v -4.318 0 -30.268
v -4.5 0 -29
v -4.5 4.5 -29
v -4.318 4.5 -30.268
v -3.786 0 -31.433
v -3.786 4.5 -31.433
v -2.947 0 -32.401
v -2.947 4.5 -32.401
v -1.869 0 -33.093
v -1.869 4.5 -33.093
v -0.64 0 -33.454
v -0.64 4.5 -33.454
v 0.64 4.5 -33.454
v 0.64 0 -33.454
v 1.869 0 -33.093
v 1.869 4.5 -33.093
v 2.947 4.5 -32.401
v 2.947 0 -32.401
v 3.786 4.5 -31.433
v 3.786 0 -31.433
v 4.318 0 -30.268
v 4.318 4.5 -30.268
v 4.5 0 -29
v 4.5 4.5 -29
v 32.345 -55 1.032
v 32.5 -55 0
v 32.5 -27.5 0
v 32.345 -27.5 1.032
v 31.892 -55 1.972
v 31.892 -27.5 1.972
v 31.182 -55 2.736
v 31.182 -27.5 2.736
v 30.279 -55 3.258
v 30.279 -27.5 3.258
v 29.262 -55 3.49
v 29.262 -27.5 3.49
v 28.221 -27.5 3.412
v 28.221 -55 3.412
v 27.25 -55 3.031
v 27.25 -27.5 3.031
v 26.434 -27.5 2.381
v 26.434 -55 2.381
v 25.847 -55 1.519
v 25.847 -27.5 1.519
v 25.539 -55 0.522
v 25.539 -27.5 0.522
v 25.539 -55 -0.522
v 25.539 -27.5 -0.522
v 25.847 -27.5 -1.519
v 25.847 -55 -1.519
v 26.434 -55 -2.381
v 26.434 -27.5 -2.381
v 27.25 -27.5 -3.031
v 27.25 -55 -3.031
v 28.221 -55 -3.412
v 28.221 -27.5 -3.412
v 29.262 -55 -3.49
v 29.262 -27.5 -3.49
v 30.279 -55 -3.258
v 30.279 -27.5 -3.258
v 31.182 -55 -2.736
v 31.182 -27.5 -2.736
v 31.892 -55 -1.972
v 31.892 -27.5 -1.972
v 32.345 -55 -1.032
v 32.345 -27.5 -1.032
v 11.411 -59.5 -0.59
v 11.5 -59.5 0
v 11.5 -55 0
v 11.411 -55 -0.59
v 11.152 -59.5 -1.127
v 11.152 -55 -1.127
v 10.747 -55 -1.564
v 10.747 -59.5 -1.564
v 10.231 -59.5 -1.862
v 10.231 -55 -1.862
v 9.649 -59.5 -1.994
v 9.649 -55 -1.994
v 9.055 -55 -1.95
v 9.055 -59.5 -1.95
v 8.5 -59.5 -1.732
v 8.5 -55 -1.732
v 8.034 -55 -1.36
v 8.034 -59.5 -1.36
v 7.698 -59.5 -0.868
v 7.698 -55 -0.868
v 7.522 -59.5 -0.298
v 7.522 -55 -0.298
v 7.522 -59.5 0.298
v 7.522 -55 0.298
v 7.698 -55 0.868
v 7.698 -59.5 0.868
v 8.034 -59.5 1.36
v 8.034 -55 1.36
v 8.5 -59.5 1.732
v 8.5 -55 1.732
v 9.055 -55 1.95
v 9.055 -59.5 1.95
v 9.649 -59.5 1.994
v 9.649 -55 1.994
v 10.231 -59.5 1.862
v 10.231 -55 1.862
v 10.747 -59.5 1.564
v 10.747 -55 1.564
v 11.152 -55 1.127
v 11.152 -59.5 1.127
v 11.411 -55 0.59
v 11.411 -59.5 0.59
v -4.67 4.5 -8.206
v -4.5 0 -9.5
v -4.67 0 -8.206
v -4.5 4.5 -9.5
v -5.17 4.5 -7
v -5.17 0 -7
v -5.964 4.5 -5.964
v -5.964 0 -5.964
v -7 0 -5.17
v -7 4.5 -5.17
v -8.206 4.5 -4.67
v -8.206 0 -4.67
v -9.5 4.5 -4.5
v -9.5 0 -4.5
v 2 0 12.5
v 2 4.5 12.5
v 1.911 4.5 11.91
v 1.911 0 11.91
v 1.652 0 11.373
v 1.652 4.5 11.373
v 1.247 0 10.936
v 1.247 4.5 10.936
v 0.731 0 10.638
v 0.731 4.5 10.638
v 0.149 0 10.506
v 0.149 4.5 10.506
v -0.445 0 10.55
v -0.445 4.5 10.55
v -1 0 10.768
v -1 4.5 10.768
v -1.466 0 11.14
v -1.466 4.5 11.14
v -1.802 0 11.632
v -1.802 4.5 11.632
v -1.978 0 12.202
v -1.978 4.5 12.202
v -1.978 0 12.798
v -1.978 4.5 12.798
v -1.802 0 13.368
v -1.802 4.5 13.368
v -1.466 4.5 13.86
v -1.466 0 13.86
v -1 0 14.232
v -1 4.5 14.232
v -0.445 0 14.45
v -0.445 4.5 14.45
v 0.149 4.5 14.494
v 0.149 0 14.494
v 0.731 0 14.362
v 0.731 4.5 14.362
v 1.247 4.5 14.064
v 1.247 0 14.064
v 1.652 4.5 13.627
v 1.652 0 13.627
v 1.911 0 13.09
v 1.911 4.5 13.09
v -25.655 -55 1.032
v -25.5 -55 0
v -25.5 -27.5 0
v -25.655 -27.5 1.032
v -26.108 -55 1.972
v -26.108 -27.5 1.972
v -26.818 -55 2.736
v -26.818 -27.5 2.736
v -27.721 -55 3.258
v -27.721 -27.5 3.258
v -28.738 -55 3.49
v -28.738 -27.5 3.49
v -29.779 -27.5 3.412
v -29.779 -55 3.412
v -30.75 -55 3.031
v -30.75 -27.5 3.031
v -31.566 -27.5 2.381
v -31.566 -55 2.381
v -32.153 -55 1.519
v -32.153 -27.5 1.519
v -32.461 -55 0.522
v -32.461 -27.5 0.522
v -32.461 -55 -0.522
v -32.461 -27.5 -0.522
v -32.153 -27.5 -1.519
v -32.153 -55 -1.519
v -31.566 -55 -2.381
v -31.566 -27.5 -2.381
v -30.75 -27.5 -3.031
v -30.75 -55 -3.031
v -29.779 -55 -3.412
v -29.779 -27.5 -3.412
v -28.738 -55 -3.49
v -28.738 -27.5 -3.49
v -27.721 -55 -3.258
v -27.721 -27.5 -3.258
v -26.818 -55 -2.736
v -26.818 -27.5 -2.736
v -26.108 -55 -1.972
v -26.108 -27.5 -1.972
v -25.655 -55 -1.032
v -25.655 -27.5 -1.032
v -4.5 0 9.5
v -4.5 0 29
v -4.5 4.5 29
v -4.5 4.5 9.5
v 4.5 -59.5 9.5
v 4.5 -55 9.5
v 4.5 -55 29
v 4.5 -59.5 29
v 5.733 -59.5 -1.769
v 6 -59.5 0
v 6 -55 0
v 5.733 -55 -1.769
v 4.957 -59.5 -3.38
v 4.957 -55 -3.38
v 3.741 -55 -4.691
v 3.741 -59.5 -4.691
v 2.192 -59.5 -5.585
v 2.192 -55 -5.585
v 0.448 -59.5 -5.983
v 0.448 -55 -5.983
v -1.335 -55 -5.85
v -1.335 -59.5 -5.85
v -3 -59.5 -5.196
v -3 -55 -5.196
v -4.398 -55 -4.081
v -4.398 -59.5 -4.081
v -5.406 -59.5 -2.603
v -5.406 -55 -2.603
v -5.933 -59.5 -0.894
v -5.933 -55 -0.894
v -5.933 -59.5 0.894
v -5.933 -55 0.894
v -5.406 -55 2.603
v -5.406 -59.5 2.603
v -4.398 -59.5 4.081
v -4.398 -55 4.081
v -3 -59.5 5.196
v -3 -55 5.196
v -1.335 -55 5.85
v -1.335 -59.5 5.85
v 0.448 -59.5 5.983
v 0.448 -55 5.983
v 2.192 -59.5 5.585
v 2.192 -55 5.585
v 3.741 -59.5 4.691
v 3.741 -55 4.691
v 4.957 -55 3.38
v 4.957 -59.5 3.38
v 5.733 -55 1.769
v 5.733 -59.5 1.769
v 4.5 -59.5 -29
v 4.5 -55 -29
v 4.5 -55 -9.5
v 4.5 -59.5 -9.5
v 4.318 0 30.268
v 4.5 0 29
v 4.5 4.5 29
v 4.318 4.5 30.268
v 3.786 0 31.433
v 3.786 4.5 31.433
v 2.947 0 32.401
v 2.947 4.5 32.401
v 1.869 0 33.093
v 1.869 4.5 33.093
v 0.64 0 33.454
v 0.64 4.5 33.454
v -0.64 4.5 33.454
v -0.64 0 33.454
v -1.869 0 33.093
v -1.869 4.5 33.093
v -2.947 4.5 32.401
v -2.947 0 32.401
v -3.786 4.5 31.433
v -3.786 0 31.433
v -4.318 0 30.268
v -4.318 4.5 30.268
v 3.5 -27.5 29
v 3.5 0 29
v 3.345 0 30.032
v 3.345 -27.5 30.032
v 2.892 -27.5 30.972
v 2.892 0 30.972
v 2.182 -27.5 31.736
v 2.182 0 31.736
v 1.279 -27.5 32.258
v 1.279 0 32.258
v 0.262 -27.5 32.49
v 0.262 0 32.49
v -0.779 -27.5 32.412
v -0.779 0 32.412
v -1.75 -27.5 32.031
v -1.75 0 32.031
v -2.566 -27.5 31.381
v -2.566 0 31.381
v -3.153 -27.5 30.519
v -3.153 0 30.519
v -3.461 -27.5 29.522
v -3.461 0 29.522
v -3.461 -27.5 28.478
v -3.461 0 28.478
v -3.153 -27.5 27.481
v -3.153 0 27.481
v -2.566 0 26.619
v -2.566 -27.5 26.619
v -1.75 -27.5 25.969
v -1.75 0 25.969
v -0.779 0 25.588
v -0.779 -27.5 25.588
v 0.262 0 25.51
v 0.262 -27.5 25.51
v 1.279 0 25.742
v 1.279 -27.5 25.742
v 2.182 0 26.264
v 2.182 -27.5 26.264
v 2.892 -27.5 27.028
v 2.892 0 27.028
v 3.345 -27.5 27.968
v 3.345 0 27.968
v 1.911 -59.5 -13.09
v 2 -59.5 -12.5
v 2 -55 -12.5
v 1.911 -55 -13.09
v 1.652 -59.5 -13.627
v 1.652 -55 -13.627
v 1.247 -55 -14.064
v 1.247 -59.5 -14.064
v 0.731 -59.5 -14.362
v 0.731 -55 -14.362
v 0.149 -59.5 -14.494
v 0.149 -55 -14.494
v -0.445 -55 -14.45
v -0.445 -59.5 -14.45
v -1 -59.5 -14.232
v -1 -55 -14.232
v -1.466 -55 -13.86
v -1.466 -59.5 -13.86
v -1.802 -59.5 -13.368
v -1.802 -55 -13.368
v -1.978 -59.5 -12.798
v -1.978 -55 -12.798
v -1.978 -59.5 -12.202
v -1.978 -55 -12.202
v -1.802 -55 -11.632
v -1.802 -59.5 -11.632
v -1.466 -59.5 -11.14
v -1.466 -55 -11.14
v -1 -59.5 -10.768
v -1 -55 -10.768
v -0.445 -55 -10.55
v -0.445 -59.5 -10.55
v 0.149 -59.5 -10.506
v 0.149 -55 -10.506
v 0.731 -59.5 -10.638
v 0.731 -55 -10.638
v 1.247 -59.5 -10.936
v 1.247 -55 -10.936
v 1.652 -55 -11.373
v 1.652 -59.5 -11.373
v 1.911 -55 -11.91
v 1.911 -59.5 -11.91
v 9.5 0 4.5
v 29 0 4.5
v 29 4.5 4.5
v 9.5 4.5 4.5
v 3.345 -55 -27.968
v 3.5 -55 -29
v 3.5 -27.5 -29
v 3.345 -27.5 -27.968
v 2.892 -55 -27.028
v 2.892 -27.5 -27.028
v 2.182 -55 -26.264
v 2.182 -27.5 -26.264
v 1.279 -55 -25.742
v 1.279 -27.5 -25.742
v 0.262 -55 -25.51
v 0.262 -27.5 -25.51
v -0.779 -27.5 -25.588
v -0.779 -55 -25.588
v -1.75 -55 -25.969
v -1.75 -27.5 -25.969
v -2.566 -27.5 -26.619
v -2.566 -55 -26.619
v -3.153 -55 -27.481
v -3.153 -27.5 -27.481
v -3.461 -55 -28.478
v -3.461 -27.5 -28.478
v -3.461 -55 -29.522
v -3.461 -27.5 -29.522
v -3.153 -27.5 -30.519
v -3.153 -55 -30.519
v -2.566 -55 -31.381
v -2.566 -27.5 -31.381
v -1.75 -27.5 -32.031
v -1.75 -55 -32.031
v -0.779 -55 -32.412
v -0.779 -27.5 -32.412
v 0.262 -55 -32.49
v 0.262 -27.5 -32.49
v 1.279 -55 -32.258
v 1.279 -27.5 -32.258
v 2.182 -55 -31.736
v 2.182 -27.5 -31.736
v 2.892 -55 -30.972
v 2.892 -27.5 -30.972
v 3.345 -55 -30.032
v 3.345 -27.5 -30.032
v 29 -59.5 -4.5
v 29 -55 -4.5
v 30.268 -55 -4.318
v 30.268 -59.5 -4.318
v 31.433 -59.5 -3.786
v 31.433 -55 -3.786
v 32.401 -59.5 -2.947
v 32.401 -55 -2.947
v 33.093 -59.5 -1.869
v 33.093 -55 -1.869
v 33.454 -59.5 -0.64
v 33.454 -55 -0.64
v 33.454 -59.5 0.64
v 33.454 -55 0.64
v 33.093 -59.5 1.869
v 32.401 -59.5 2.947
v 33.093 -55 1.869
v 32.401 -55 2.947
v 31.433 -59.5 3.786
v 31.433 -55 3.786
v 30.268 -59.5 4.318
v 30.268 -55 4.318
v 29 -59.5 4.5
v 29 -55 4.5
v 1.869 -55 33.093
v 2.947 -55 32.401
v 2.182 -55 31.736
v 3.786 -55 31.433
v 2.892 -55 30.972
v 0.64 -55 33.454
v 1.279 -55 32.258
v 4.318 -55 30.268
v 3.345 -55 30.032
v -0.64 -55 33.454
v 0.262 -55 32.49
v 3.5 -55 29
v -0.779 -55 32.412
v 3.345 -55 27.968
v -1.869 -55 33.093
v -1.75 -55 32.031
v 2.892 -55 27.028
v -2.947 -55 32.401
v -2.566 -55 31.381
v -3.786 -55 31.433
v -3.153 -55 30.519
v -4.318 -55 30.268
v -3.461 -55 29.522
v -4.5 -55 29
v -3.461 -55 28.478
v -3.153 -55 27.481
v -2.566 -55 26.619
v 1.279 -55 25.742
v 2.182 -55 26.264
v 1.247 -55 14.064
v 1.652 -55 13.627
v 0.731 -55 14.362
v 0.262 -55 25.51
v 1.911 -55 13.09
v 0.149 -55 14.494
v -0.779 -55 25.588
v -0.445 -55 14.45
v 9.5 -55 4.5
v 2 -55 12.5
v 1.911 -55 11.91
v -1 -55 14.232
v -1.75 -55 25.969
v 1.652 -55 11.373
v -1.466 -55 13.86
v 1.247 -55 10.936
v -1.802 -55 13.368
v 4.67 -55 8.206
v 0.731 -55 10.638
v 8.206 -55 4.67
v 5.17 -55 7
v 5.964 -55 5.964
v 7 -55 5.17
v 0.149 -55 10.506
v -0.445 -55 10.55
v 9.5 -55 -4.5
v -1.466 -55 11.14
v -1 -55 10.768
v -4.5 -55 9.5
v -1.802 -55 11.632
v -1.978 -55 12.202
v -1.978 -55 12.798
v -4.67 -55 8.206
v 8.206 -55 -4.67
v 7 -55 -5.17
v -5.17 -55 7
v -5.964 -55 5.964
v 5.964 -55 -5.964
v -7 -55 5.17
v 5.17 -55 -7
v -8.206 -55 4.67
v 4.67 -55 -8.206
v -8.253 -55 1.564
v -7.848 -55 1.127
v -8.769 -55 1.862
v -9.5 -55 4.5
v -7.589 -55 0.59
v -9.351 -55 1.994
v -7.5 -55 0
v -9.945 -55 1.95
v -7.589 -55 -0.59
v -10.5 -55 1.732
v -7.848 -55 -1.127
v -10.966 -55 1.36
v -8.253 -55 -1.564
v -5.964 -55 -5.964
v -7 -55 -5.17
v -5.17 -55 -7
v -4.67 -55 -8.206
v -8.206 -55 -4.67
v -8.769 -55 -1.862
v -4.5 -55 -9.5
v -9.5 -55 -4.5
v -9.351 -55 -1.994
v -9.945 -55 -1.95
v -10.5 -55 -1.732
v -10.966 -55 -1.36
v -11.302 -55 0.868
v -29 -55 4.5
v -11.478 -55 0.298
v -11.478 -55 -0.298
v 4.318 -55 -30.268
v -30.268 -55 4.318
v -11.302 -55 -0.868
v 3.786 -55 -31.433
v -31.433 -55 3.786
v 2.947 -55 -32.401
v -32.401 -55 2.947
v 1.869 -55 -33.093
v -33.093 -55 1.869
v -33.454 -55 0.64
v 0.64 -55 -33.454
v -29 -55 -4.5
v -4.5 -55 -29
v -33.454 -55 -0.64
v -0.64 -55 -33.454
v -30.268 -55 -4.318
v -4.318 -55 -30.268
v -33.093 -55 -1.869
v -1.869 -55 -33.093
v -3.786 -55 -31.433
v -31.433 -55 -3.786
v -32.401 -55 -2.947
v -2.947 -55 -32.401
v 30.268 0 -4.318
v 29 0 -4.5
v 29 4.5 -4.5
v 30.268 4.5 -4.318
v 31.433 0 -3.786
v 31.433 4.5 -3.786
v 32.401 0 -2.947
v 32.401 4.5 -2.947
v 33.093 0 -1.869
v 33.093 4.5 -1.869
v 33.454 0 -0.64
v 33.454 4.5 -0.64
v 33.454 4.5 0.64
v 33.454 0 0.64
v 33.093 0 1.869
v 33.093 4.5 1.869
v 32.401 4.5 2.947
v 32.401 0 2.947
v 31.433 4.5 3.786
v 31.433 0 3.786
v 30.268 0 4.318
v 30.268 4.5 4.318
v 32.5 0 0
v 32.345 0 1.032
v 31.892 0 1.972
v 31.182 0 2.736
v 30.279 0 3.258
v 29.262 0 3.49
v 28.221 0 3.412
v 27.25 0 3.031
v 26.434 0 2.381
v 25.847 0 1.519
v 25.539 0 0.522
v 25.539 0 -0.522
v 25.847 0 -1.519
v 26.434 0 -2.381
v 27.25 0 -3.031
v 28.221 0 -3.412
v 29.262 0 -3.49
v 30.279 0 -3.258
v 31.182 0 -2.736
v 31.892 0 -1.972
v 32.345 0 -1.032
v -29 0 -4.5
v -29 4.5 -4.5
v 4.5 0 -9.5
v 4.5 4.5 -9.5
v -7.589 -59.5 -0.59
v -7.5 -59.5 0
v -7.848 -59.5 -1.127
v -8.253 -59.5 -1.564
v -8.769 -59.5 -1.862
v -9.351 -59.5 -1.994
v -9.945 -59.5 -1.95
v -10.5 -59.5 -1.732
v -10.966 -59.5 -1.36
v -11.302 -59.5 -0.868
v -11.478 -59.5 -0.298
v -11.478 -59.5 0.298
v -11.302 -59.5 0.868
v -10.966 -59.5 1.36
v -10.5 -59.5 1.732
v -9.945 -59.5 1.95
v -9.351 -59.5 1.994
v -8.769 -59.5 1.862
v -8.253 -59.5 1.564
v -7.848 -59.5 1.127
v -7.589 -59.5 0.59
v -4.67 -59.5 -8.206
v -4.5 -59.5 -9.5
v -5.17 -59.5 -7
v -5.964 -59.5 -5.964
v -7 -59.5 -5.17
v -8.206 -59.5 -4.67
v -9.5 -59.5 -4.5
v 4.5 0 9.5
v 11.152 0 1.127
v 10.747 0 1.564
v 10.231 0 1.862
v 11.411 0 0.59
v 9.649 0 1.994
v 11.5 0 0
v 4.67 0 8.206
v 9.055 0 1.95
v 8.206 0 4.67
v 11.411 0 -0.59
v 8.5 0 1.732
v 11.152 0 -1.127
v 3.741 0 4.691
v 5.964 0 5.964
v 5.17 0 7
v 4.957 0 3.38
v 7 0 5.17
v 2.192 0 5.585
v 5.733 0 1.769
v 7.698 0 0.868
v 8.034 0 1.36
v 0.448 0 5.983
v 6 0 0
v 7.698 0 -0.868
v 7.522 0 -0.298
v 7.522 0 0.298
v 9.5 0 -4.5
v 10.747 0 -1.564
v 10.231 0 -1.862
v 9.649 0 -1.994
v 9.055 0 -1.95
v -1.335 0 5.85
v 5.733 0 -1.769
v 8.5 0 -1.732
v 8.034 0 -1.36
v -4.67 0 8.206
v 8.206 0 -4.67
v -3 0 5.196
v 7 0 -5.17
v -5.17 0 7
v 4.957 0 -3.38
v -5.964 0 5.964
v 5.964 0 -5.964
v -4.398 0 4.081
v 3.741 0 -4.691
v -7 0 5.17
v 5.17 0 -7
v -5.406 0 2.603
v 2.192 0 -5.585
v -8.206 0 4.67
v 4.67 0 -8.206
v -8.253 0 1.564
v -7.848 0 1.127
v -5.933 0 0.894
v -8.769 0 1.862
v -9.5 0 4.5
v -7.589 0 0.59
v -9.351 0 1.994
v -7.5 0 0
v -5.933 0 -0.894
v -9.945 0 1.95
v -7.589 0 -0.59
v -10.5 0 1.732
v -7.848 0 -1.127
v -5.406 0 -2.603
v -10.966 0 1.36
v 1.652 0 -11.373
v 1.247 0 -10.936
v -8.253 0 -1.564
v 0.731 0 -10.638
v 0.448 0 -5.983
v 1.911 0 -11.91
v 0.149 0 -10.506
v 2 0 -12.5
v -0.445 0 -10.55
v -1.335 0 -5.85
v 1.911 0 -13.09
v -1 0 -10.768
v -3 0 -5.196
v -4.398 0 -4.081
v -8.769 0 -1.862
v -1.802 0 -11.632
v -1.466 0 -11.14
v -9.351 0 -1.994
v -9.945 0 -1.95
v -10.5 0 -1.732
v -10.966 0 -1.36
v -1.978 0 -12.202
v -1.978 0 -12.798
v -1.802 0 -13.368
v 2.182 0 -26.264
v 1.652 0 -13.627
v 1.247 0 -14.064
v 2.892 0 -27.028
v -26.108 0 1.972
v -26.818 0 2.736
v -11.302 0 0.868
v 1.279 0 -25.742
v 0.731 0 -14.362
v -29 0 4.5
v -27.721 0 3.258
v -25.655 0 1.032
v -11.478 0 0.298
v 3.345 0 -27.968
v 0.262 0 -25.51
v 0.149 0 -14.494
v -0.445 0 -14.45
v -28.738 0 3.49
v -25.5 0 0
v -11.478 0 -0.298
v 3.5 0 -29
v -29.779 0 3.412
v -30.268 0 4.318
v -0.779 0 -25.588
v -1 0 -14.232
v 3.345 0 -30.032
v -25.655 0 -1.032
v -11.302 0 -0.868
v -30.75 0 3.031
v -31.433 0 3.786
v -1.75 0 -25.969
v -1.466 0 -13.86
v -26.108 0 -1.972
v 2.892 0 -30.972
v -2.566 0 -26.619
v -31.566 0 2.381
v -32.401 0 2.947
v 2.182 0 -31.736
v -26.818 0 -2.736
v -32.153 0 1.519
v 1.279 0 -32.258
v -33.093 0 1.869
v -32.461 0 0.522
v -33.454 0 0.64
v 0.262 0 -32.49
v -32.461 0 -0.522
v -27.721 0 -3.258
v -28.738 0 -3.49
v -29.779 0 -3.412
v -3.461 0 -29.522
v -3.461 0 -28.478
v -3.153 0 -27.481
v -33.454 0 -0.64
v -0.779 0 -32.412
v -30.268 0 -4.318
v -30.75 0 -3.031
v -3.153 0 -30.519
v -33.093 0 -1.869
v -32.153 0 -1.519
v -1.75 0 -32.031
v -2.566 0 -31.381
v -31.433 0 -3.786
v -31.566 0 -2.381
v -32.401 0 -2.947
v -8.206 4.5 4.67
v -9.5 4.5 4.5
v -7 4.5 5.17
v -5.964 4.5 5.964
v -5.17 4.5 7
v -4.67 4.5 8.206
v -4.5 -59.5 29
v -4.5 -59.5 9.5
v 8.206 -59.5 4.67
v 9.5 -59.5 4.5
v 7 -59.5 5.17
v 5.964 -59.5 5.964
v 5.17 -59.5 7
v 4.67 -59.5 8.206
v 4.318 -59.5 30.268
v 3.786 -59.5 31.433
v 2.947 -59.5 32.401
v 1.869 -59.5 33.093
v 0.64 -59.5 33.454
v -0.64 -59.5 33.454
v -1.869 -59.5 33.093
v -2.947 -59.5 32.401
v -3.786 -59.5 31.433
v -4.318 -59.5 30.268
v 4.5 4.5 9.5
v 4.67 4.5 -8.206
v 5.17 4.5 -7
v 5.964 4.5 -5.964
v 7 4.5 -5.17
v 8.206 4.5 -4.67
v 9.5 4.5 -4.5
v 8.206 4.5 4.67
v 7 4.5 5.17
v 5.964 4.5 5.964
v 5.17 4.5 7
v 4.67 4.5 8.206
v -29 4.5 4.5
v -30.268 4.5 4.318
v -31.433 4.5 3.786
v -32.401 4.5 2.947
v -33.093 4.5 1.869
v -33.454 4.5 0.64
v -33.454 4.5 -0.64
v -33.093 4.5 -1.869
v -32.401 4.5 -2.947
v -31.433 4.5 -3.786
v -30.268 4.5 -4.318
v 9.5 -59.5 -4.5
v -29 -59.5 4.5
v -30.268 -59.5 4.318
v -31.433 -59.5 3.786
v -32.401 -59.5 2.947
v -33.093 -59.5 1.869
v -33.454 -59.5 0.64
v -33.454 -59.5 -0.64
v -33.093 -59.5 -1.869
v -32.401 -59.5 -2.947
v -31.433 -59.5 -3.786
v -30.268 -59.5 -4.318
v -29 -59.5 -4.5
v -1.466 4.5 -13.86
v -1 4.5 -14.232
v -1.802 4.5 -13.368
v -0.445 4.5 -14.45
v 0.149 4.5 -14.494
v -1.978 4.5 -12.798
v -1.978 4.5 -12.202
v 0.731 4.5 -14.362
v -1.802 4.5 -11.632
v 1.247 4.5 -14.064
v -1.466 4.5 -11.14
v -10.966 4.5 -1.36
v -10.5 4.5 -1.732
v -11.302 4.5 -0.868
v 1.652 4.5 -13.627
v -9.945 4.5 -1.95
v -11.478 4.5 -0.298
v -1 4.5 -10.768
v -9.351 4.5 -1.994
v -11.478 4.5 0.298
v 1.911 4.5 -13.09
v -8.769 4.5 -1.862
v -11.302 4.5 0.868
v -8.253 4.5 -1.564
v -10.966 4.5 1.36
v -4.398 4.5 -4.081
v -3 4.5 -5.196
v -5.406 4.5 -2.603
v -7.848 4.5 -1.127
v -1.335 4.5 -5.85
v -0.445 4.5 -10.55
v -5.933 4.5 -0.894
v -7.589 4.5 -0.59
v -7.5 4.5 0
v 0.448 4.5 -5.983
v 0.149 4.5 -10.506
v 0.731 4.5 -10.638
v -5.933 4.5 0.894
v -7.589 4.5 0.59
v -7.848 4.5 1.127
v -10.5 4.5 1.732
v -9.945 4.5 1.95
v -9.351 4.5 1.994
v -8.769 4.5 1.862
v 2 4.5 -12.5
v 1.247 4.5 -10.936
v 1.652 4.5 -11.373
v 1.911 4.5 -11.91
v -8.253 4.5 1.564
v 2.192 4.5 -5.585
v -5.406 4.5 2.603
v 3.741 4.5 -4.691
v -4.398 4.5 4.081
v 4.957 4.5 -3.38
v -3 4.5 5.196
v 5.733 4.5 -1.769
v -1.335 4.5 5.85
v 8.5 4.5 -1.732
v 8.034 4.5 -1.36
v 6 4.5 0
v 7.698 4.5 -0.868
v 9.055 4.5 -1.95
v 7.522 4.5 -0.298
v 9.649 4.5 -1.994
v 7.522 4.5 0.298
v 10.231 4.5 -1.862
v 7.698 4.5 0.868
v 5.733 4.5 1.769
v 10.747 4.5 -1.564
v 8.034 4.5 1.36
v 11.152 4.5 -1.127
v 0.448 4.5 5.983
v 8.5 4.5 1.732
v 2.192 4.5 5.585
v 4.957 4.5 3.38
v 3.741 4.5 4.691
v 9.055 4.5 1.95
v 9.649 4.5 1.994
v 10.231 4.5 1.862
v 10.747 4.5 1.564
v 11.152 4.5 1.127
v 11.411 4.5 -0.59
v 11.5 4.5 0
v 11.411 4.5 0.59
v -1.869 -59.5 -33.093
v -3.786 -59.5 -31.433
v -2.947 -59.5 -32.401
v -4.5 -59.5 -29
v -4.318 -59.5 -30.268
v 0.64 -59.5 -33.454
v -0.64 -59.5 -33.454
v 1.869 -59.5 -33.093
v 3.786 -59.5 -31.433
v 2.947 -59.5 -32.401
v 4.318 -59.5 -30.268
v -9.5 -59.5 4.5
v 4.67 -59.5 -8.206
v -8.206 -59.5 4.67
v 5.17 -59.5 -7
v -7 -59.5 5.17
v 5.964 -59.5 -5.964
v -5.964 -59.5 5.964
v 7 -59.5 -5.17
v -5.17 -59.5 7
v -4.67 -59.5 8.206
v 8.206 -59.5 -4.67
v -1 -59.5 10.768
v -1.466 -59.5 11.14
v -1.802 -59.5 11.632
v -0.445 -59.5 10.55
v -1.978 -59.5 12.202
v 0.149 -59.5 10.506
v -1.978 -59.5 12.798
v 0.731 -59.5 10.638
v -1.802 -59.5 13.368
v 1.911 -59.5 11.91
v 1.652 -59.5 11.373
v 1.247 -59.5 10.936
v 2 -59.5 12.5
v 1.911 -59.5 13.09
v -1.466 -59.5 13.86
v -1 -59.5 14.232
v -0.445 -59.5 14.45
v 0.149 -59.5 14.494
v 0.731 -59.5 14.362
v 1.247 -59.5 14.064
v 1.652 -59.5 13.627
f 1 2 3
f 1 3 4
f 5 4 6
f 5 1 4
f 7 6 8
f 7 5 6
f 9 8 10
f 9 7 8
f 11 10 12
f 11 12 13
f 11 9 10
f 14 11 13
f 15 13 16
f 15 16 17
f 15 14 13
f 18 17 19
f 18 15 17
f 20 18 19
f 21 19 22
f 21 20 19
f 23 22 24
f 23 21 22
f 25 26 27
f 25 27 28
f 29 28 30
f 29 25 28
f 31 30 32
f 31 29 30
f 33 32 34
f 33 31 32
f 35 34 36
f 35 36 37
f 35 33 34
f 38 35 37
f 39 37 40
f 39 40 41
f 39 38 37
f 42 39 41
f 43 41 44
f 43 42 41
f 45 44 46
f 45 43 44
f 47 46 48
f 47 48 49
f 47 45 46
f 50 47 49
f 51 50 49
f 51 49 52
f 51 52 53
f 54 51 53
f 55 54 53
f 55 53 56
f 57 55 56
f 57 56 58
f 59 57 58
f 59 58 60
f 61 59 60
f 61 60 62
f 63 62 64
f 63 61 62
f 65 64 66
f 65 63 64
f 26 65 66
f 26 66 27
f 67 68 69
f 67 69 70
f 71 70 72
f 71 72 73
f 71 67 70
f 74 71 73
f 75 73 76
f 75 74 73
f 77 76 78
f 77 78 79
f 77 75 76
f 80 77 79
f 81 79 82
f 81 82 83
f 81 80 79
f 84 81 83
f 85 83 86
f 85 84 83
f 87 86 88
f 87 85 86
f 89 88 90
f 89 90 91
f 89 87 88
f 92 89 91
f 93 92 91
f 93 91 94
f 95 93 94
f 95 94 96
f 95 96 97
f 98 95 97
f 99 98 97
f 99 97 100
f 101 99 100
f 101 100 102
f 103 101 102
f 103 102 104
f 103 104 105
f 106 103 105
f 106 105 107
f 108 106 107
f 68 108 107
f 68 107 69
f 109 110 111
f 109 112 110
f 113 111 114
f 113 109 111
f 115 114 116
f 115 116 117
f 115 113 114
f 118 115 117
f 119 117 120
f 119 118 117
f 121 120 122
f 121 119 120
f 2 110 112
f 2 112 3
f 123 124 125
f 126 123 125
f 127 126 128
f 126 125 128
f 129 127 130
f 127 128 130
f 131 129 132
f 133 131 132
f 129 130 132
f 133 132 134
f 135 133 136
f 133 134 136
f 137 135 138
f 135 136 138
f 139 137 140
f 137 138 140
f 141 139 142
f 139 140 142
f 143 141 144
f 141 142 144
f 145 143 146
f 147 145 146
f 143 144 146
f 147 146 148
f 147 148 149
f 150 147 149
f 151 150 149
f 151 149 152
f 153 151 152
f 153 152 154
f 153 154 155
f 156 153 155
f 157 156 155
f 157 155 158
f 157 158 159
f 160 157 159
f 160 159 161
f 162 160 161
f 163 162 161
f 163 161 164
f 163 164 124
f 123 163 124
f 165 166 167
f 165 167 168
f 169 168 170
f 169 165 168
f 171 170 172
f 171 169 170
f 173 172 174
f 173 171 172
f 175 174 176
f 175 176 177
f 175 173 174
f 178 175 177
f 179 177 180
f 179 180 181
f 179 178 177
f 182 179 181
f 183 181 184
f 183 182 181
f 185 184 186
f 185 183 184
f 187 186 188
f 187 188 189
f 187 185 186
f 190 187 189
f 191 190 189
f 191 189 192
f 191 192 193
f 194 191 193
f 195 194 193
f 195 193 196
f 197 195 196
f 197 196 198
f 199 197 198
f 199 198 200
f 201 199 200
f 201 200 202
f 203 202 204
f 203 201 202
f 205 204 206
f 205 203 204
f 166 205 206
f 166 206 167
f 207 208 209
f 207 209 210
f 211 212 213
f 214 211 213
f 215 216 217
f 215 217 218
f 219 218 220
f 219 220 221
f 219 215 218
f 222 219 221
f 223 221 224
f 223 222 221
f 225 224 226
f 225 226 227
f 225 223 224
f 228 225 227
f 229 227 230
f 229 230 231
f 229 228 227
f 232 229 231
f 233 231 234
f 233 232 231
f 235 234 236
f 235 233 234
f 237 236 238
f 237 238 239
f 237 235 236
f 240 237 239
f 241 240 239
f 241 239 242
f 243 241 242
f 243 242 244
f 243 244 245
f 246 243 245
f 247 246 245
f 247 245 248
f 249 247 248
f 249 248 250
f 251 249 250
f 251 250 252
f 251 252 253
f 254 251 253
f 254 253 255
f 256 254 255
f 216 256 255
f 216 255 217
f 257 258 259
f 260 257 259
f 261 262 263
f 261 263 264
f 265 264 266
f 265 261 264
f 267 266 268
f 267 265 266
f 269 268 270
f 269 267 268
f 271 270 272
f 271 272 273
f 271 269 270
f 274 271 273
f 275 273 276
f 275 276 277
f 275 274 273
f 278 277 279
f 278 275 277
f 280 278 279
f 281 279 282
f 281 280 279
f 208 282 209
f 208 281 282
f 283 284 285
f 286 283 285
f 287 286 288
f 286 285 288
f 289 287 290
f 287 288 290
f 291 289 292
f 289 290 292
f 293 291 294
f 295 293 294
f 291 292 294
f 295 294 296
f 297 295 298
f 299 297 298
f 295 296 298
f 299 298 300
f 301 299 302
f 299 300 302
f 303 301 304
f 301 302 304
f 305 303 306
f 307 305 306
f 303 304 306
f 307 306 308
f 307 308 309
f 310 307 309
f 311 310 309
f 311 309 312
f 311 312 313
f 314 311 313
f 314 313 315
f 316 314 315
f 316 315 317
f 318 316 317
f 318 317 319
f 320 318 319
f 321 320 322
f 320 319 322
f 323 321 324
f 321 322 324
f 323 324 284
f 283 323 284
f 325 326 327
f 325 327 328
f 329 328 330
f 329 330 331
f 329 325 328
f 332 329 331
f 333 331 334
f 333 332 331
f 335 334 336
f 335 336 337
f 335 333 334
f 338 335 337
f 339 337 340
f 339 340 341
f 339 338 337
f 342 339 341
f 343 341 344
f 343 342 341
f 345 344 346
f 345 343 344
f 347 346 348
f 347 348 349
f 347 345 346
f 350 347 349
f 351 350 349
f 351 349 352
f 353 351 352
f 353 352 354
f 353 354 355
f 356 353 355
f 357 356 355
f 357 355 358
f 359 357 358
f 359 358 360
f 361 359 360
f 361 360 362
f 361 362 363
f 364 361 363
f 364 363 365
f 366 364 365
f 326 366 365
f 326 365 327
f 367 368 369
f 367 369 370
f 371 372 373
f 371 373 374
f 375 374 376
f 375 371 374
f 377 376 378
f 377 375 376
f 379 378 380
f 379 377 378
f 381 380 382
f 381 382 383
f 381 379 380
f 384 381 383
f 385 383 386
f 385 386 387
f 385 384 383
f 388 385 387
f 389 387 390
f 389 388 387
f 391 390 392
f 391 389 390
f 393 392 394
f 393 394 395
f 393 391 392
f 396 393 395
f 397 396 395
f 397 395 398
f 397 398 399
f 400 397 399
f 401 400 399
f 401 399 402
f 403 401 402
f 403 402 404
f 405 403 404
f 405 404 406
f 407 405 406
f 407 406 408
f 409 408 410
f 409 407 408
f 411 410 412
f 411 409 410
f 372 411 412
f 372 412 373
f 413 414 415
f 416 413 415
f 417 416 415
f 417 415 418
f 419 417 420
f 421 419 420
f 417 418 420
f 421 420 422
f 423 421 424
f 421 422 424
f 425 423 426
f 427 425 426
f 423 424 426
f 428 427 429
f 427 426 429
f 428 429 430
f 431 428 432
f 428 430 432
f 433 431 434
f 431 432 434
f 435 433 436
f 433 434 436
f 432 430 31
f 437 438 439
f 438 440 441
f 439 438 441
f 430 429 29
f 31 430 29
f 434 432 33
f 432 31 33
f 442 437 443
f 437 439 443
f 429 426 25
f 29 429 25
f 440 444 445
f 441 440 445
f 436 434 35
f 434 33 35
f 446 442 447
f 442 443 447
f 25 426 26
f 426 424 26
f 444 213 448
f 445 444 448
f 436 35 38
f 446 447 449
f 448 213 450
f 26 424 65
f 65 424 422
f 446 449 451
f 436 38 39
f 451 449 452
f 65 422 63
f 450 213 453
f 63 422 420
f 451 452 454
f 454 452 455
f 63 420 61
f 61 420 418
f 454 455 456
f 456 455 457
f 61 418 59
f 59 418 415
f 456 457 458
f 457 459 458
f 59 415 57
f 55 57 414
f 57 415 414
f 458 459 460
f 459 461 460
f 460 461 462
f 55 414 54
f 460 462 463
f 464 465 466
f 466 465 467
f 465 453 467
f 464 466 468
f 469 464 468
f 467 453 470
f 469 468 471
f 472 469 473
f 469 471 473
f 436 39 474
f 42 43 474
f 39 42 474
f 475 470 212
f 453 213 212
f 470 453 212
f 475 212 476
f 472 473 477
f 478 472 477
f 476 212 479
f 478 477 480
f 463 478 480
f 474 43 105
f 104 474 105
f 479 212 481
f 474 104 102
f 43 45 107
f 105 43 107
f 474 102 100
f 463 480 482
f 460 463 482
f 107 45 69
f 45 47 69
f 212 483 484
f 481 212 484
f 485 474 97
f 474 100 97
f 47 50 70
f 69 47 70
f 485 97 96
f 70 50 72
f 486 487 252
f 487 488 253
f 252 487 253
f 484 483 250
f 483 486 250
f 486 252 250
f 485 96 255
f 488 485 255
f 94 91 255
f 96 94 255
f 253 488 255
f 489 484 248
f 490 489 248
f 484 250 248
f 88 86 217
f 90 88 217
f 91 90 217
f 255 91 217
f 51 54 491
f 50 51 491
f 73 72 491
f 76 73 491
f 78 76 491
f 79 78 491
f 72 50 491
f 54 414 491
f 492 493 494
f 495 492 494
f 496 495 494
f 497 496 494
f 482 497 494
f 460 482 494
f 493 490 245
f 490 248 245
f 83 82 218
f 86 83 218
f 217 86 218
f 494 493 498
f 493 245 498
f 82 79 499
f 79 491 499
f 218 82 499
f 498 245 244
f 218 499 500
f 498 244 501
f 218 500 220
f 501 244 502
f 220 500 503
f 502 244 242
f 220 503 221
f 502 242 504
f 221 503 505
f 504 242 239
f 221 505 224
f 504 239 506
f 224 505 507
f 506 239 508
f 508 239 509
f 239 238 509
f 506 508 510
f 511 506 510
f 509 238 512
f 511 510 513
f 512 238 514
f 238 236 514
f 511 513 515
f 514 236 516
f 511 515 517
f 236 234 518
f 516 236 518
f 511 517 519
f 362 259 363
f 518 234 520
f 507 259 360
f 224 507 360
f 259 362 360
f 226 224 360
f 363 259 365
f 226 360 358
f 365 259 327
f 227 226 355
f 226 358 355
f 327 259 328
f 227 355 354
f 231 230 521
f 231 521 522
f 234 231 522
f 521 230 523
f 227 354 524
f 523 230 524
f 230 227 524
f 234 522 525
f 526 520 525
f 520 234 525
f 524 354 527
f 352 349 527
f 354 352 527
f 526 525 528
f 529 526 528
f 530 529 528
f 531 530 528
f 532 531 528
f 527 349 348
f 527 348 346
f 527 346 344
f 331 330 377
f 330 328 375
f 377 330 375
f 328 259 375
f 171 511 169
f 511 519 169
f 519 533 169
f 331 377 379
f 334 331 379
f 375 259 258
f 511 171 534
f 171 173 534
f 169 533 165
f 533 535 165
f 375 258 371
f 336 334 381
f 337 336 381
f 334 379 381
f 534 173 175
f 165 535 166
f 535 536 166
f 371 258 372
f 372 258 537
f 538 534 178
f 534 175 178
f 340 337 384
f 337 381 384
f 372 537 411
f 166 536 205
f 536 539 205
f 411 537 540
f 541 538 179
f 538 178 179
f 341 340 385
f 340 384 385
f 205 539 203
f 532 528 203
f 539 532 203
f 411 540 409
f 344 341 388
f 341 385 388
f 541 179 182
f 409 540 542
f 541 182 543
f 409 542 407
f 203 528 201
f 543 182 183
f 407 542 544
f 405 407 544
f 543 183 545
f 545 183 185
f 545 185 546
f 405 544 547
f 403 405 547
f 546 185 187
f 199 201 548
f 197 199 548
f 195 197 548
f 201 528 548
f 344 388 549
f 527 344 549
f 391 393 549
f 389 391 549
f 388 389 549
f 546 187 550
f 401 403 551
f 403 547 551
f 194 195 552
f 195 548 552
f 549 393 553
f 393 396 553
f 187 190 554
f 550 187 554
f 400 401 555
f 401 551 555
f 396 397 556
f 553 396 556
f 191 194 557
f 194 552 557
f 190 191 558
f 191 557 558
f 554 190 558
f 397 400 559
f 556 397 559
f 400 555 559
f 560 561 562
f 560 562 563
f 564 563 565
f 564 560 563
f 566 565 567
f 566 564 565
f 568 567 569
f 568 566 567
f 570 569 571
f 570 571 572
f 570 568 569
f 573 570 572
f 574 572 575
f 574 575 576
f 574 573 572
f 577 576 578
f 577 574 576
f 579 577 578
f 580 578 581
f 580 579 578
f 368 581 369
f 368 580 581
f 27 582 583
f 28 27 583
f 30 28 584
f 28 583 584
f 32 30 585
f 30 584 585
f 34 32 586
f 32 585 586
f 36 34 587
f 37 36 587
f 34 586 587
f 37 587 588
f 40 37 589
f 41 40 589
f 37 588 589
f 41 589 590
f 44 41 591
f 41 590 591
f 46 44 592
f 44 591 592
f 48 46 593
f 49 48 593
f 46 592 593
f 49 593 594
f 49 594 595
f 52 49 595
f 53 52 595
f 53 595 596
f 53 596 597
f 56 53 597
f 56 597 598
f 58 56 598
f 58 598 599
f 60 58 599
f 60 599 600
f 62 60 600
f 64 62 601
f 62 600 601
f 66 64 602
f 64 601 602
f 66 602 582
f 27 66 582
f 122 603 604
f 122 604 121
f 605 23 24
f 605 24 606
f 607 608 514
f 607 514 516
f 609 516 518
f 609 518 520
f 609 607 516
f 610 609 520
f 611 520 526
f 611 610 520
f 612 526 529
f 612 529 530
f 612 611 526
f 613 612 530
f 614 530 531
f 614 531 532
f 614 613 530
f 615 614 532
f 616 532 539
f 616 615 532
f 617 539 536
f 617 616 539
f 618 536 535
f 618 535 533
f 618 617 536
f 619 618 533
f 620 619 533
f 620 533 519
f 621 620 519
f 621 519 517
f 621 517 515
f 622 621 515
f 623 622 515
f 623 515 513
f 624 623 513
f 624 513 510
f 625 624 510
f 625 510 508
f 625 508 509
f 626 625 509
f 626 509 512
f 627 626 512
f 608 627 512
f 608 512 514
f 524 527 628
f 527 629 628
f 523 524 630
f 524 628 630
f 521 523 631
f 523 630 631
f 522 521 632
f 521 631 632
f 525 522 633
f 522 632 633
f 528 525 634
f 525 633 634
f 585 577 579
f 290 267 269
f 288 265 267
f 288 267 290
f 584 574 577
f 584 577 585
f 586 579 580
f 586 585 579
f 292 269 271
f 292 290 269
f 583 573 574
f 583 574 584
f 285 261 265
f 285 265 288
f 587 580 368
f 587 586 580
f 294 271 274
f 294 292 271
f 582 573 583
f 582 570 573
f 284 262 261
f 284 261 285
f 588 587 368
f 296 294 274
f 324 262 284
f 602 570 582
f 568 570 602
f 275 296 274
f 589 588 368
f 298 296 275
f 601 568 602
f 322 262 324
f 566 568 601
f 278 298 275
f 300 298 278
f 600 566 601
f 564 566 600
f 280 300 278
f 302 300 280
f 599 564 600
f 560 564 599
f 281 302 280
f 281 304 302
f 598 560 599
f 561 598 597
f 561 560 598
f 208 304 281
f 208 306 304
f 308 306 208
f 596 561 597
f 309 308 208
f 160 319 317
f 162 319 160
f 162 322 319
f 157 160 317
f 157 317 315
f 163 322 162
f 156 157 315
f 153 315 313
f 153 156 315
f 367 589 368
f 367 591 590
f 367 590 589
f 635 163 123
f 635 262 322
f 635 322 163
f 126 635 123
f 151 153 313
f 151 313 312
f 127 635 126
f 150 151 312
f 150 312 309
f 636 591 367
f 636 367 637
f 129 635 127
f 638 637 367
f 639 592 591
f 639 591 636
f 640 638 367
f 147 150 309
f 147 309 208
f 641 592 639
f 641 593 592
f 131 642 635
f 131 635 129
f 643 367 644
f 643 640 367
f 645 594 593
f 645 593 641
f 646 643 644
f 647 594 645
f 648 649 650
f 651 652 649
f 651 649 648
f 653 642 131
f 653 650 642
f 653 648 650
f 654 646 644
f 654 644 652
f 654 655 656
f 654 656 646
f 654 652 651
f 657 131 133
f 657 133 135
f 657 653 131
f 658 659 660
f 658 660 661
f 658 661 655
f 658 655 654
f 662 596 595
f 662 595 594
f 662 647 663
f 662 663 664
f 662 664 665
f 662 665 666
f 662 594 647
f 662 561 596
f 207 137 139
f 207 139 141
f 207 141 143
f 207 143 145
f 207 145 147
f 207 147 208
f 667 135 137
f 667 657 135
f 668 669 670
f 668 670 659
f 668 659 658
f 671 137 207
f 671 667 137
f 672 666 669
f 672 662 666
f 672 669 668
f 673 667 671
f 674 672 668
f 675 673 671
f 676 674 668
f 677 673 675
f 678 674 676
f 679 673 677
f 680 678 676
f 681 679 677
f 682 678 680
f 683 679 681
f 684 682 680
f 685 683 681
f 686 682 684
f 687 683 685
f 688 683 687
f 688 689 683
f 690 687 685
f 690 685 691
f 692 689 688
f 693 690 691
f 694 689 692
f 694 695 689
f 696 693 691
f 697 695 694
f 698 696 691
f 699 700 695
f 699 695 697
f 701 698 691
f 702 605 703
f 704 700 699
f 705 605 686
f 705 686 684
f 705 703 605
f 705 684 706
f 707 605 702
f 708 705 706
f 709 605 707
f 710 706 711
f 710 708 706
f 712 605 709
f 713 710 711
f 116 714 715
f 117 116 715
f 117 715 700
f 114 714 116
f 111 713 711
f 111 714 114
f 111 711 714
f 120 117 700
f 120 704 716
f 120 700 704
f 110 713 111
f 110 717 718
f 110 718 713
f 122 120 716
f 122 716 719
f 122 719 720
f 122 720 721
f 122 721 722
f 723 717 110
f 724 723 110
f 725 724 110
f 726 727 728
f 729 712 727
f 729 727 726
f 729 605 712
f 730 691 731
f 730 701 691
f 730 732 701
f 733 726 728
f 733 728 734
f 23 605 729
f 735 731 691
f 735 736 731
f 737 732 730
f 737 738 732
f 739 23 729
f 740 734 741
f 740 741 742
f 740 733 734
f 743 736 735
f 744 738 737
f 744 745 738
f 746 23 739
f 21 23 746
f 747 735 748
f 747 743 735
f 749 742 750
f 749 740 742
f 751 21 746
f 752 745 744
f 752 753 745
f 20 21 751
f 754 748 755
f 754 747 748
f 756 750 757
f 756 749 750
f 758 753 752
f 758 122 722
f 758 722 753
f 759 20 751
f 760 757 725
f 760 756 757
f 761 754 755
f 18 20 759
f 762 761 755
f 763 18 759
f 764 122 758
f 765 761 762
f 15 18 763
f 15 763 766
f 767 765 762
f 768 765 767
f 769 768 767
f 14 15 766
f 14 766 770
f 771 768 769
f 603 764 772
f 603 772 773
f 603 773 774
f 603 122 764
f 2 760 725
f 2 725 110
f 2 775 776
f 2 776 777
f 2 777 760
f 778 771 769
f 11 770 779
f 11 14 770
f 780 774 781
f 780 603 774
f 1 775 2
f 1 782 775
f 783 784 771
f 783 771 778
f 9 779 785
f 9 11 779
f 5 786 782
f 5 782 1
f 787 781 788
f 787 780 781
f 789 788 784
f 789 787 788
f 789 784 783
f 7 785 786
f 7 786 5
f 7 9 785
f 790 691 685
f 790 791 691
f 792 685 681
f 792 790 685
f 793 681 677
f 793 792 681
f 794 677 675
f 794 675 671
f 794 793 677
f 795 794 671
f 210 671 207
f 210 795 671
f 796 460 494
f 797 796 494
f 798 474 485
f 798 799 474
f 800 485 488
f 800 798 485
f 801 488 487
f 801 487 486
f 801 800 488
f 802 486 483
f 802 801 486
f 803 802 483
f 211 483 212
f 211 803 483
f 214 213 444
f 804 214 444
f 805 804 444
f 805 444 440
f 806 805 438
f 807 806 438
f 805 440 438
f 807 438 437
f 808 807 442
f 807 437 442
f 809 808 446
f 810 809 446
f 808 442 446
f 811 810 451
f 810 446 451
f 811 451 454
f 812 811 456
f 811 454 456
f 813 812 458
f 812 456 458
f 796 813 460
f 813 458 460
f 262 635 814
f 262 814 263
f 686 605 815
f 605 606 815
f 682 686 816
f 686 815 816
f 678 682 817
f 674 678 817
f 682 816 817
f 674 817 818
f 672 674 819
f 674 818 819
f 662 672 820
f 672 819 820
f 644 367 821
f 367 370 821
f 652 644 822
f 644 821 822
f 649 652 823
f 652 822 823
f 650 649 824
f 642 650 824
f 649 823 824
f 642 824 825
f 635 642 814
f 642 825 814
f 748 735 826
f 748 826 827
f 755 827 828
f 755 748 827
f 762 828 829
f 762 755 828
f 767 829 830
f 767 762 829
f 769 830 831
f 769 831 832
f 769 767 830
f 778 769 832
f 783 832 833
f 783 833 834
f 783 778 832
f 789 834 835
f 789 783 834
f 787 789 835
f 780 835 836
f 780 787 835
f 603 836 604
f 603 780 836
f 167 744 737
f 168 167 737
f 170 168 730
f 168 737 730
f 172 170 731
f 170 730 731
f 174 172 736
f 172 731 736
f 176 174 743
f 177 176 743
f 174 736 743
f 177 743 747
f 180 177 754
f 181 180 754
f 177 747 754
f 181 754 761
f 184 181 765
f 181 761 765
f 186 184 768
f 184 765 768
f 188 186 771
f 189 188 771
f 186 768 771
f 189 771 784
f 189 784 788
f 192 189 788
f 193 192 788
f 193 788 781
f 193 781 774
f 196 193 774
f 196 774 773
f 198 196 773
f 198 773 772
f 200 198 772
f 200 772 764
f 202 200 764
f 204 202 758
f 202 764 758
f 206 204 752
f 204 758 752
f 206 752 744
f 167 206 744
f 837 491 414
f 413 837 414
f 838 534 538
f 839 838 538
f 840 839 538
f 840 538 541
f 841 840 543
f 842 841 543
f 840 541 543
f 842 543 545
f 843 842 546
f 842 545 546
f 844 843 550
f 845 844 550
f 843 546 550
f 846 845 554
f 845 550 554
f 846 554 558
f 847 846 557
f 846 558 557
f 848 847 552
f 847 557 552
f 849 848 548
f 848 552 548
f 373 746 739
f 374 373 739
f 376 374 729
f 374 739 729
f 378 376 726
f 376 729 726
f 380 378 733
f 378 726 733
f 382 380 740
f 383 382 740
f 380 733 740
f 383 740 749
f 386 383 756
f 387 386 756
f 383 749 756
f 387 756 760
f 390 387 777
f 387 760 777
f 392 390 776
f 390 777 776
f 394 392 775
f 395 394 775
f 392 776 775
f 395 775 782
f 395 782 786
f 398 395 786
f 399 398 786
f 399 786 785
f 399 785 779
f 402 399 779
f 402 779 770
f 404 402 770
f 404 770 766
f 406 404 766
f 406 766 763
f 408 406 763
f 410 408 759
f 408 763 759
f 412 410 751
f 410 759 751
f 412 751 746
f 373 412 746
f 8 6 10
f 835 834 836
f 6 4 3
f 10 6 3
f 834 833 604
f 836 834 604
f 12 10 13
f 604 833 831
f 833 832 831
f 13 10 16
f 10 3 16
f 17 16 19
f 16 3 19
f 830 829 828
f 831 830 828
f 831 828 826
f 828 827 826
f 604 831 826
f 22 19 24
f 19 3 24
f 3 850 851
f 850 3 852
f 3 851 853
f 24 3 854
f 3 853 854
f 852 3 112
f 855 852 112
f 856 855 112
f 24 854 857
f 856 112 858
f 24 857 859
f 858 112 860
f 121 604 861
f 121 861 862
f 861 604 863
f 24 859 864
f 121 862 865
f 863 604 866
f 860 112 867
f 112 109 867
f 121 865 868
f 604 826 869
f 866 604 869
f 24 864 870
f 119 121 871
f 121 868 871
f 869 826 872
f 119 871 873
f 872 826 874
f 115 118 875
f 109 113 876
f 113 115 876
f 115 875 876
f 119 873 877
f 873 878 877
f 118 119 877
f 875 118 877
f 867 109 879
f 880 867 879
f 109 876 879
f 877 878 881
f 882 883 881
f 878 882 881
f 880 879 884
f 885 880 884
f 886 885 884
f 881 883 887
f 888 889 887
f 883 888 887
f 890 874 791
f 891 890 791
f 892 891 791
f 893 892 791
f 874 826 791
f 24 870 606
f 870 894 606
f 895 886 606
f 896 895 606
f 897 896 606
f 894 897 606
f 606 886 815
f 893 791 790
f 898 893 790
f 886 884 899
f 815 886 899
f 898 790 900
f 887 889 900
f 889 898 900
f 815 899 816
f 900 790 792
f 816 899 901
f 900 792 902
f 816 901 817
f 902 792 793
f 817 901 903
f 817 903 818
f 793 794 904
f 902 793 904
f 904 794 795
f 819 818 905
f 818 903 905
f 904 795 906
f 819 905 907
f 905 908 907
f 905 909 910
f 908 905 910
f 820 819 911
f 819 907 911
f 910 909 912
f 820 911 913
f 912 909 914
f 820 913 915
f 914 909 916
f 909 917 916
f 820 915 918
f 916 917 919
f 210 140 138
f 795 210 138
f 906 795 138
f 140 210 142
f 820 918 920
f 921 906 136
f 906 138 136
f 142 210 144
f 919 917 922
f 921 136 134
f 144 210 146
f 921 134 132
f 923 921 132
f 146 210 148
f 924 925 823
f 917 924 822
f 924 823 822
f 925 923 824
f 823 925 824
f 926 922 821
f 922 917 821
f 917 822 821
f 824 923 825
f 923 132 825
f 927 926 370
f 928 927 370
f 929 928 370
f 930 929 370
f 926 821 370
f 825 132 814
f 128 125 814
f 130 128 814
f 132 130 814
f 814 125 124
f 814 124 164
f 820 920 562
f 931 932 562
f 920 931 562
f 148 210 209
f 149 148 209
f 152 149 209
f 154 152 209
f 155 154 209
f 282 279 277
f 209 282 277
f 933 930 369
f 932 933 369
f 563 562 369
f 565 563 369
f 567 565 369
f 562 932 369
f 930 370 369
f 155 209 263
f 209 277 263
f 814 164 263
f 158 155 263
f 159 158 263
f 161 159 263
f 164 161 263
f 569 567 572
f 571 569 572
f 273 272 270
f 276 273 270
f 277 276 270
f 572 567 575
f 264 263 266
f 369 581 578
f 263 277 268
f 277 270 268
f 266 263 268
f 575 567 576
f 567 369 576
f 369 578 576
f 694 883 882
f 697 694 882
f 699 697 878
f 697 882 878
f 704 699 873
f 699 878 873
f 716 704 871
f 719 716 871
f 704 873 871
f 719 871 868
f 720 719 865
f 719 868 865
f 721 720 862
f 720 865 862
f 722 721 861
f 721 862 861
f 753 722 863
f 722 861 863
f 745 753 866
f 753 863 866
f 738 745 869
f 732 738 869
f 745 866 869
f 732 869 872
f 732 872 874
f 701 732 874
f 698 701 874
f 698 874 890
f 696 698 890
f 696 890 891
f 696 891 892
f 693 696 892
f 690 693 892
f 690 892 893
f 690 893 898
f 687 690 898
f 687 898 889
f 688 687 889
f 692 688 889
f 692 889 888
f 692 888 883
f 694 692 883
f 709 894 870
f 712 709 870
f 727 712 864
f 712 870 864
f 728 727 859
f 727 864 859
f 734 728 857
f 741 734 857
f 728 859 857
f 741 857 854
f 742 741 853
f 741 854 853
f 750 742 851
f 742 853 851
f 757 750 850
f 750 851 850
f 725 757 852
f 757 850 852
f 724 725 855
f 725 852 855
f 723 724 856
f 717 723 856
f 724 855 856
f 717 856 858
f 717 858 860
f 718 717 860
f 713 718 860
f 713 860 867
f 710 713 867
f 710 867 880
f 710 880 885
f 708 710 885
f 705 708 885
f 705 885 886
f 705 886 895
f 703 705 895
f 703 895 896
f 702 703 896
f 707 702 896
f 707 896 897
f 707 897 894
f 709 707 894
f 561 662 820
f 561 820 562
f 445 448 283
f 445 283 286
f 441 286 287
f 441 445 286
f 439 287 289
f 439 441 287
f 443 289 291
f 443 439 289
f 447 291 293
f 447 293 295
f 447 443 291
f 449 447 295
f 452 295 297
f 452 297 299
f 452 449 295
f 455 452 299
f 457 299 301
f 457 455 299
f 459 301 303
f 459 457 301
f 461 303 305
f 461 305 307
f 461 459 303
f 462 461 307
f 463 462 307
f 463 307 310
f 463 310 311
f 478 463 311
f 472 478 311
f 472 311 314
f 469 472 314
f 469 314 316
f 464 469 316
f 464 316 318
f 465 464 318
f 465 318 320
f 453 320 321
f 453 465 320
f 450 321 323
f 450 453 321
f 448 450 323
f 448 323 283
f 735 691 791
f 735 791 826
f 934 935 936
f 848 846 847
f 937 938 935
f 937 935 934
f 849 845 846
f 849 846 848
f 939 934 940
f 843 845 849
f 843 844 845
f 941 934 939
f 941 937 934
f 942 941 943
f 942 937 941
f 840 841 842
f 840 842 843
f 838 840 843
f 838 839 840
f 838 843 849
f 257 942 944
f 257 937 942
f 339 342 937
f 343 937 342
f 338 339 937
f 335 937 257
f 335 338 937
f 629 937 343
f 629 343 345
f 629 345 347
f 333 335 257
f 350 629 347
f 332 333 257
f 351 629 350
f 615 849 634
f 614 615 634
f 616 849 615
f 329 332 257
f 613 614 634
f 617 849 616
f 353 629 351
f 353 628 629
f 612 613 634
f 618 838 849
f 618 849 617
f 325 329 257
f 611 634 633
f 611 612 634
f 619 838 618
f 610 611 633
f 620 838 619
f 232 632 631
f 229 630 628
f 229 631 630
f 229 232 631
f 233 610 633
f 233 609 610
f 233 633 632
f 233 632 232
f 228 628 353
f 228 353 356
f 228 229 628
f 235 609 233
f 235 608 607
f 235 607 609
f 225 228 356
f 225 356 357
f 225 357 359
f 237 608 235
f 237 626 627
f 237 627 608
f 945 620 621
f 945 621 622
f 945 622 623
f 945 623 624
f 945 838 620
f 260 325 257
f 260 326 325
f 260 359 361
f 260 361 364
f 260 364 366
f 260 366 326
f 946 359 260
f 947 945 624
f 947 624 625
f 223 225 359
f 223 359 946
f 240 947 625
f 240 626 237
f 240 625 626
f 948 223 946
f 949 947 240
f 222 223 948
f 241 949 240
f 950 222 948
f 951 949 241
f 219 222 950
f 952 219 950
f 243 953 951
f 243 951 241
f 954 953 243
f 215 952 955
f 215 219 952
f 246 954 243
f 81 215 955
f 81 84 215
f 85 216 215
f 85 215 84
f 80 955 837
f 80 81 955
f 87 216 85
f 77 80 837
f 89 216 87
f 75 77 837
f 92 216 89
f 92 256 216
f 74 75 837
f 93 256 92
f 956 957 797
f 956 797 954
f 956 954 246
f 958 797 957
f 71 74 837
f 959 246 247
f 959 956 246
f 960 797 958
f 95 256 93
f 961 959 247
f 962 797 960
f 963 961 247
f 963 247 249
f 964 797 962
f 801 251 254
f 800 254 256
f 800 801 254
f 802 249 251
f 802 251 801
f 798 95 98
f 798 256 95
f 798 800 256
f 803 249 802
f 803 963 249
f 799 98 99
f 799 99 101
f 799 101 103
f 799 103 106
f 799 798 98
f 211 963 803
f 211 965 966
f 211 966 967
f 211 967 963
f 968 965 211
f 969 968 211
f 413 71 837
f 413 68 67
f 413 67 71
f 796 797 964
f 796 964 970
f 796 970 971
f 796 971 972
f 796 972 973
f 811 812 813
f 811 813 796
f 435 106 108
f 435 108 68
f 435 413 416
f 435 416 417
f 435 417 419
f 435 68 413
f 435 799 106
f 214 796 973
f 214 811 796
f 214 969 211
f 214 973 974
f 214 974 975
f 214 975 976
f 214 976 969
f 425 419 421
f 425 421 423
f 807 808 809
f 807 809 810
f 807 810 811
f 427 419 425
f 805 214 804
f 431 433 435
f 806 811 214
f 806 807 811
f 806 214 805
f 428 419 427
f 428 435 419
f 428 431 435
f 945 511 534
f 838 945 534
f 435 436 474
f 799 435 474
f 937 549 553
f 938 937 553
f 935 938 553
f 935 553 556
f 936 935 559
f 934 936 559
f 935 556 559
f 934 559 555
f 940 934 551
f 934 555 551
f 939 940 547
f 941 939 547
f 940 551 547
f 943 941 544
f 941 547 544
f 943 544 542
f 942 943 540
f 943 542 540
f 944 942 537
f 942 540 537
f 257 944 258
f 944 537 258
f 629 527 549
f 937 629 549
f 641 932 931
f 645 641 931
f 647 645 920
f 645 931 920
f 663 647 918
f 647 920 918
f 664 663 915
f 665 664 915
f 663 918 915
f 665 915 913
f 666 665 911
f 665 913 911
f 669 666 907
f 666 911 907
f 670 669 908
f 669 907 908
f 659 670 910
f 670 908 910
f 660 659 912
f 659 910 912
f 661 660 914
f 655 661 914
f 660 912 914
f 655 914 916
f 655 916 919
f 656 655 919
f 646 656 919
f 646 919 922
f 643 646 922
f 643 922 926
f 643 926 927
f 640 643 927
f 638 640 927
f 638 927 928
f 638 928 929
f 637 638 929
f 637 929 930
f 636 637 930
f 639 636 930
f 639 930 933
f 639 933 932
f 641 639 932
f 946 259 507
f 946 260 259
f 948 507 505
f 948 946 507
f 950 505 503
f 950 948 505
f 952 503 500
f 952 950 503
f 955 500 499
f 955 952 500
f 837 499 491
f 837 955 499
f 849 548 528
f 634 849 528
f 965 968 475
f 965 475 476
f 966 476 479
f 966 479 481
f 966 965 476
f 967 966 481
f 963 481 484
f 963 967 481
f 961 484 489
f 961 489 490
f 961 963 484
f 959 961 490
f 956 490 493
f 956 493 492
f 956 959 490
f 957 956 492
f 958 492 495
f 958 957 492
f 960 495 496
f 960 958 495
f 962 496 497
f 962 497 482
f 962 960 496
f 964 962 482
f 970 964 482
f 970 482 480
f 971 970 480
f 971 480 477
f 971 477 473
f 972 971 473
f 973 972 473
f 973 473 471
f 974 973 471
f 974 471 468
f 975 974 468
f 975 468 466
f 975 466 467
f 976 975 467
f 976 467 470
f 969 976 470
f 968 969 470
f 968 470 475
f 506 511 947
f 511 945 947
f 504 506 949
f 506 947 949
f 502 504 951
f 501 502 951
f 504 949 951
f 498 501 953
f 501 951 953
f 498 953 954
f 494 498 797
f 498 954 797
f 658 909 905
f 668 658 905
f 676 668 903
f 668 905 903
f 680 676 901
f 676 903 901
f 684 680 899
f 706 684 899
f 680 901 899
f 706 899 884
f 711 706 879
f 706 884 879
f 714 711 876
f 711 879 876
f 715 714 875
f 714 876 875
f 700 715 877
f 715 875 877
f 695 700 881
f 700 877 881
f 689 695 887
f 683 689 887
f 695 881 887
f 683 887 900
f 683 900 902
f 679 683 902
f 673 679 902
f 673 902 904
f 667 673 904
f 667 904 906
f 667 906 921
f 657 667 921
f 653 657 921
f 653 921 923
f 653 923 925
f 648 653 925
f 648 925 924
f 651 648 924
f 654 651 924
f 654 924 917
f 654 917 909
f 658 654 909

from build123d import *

# Parameters (mm, degrees)
BOSS_EXTRUDE1_DEPTH      = 4.5
SKETCH2_R                = 6
SKETCH2_R_2              = 2
SKETCH2_R_3              = 3.5
CUT_EXTRUDE1_DEPTH       = 5.5
FILLET1_R                = 5
SKETCH4_R                = 3.5
BOSS_EXTRUDE2_DEPTH      = 27.5
BOSS_EXTRUDE2_DEPTH_BACK = 4.5


with BuildPart() as part:
    # Sketch1 → Boss-Extrude1 (new body)
    with BuildSketch(Plane(origin=(0, 0, 0), x_dir=(1, 0, 0), z_dir=(0, 1, 0))):
        with BuildLine():
            Line((4.5, 29), (4.5, -29))
            ThreePointArc((4.5, -29), (0, -33.5), (-4.5, -29))
            Line((-4.5, -29), (-4.5, 29))
            ThreePointArc((-4.5, 29), (0, 33.5), (4.5, 29))
        make_face()
        with BuildLine():
            Line((29, -4.5), (-29, -4.5))
            ThreePointArc((-29, -4.5), (-33.5, 0), (-29, 4.5))
            Line((-29, 4.5), (29, 4.5))
            ThreePointArc((29, 4.5), (33.5, 0), (29, -4.5))
        make_face()
    extrude(amount=BOSS_EXTRUDE1_DEPTH)

    # Sketch2 → Cut-Extrude1 (cut, through all)
    with BuildSketch(Plane(origin=(0, 4.5, 0), x_dir=(1, 0, 0), z_dir=(0, 1, 0))):
        Circle(SKETCH2_R)
        with Locations((9.5, 0)):
            Circle(SKETCH2_R_2)
        with Locations((29, 0)):
            Circle(SKETCH2_R_3)
        with Locations((0, 12.5)):
            Circle(SKETCH2_R_2)
        with Locations((0, -29)):
            Circle(SKETCH2_R_3)
        with Locations((-29, 0)):
            Circle(SKETCH2_R_3)
        with Locations((0, 29)):
            Circle(SKETCH2_R_3)
        with Locations((-9.5, 0)):
            Circle(SKETCH2_R_2)
        with Locations((0, -12.5)):
            Circle(SKETCH2_R_2)
    extrude(amount=-CUT_EXTRUDE1_DEPTH, mode=Mode.SUBTRACT)

    # Fillet1
    fillet1_edges = [part.edges().sort_by_distance(p)[0] for p in [
        (4.5, 2.25, -4.5),
        (4.5, 2.25, 4.5),
        (-4.5, 2.25, -4.5),
        (-4.5, 2.25, 4.5),
    ]]
    fillet(fillet1_edges, radius=FILLET1_R)

    # Sketch4 → Boss-Extrude2 (add, two sides)
    with BuildSketch(Plane.XZ) as boss_extrude2_sk:
        with Locations((0, -29)):
            Circle(SKETCH4_R)
        with Locations((-29, 0)):
            Circle(SKETCH4_R)
        with Locations((0, 29)):
            Circle(SKETCH4_R)
        with Locations((29, 0)):
            Circle(SKETCH4_R)
    extrude(amount=BOSS_EXTRUDE2_DEPTH)
    extrude(boss_extrude2_sk.sketch, amount=-BOSS_EXTRUDE2_DEPTH_BACK)

    # Mirror2: part across plane


with BuildPart() as part_1:
    add(part.part)
    add(part.part.mirror(Plane(origin=(0, -27.5, 29), x_dir=(0, 0, 1), z_dir=(0, -1, 0))))


solid = part_1.part
